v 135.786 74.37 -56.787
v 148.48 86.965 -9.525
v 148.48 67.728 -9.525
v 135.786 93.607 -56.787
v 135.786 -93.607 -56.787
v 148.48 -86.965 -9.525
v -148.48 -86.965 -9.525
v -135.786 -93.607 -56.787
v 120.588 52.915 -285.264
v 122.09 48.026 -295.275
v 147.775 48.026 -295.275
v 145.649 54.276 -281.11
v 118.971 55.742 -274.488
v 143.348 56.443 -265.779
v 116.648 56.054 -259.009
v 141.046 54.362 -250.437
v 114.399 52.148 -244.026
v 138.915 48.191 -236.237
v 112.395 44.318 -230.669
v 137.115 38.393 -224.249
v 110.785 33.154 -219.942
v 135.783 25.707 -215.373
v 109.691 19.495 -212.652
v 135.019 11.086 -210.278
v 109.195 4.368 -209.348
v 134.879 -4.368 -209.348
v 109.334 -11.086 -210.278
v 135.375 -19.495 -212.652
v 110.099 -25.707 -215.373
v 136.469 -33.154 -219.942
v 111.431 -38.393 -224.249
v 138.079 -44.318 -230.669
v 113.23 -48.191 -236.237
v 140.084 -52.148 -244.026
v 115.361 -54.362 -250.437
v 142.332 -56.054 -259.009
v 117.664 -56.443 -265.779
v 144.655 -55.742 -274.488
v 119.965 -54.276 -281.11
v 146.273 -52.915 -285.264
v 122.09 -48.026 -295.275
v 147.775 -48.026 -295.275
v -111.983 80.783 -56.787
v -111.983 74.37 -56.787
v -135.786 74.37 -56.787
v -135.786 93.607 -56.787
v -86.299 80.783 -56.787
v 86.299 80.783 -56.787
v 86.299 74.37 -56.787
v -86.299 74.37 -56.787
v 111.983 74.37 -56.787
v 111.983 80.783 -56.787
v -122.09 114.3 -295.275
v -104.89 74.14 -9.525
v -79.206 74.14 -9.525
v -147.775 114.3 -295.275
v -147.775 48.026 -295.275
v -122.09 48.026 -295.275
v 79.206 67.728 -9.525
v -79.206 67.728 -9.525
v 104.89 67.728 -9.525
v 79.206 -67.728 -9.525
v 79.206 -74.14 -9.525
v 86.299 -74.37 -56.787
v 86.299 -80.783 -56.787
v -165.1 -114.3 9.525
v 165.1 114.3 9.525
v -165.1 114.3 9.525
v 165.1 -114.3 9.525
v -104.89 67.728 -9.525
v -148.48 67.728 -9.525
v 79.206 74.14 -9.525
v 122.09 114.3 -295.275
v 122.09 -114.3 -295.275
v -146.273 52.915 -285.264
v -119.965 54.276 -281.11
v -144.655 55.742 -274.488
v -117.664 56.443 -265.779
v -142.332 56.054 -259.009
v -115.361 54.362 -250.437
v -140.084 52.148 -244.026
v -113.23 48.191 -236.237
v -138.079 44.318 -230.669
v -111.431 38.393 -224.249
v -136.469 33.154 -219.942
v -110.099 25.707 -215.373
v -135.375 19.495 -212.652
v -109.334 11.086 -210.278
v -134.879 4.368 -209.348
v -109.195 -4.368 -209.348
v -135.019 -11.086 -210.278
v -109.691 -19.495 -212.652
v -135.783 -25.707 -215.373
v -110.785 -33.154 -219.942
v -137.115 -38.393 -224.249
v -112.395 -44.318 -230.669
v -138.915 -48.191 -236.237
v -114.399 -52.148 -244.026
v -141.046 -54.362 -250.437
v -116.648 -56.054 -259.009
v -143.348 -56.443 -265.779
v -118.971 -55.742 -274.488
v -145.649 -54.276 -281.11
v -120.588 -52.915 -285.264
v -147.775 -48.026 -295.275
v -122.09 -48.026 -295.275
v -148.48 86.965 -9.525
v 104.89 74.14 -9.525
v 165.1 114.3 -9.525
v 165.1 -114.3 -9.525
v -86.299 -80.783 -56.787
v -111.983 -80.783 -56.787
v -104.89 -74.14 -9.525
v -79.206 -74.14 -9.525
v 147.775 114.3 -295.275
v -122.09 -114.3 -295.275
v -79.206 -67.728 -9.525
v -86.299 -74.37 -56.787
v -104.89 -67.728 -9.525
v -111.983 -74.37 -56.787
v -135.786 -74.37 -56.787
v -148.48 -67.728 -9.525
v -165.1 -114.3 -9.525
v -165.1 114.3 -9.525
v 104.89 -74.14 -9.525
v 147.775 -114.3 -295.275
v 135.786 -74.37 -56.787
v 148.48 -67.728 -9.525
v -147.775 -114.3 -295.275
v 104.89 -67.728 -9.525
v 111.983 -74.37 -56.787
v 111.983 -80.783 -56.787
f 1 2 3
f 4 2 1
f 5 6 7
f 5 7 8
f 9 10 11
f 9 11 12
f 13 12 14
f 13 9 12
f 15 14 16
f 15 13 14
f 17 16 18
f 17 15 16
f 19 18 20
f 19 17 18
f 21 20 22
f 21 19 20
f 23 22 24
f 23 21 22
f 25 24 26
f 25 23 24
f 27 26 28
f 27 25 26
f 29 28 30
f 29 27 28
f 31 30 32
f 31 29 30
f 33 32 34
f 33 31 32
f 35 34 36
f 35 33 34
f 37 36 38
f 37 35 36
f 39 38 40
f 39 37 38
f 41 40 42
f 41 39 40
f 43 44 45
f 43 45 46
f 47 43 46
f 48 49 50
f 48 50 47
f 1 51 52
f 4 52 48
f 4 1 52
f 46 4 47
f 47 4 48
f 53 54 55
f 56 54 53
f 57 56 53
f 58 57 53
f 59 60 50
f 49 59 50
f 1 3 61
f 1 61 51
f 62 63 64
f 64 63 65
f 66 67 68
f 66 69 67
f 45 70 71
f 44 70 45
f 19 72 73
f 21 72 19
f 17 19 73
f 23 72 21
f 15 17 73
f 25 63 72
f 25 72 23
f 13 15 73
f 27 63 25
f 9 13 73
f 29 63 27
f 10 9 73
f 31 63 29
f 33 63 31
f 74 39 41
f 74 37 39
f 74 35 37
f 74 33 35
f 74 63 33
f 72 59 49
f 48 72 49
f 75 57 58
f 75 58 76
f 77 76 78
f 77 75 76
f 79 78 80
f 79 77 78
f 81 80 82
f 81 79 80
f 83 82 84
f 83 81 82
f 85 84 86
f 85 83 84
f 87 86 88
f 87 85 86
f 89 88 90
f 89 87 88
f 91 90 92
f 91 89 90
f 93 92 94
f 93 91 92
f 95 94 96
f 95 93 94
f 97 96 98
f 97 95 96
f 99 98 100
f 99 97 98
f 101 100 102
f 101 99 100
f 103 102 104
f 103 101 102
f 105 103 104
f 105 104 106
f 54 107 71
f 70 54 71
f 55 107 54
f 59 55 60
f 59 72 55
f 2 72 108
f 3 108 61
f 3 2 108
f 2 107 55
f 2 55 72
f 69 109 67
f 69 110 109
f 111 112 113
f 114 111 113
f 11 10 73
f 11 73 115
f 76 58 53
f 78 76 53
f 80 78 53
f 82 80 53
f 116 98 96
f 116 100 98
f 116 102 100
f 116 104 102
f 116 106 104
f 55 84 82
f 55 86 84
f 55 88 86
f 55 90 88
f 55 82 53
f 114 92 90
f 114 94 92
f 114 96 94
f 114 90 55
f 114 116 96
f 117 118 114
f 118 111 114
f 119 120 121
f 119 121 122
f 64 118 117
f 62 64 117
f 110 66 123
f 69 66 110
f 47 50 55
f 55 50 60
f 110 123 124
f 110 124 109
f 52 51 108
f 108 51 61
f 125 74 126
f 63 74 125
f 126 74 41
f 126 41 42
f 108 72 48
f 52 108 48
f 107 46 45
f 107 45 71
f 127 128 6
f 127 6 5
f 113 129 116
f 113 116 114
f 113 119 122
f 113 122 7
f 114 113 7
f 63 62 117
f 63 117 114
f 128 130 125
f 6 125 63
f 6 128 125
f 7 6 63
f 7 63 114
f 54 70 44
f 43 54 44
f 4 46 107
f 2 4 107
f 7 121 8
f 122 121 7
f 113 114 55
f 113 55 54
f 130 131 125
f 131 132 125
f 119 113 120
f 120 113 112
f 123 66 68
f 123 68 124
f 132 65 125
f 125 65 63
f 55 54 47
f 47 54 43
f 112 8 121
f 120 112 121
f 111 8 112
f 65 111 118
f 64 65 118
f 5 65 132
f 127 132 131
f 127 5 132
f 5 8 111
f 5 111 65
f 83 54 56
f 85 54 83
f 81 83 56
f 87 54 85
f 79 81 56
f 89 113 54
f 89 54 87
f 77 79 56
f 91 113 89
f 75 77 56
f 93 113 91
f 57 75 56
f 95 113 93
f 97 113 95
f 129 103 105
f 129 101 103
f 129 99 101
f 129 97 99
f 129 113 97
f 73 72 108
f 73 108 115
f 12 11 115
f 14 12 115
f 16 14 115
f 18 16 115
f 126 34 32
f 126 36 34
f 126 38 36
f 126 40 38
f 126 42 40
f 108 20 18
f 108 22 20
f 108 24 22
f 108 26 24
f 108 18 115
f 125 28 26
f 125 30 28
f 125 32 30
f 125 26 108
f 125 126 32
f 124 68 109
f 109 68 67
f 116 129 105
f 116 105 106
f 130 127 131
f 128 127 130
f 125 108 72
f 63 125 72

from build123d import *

# Parameters (mm, degrees)
F2_DEPTH      = 114.3
F3_DEPTH      = 114.3
F3_DEPTH_BACK = 114.3
F5_DEPTH      = 165.101
F5_DEPTH_BACK = 165.101
F7_DEPTH      = 165.1
F7_DEPTH_BACK = 165.1
F8_DEPTH      = 114.301
F8_DEPTH_BACK = 114.301


with BuildPart() as f2:
    # F0 (on Front) → F2 (new body, symmetric)
    with BuildSketch(Plane.XZ):
        Polygon((165.1, 9.525), (-165.1, 9.525), (-165.1, -9.525), (-148.480117321, -9.525), (-104.8901342862, -9.525), (-79.205680066, -9.525), (79.205680066, -9.525), (104.8901342862, -9.525), (148.480117321, -9.525), (165.1, -9.525), align=None)
    extrude(amount=F2_DEPTH, both=True)


with BuildPart() as f3:
    # F0 (on Front) → F3 (new body, two sides)
    with BuildSketch(Plane.XZ) as f3_sk:
        Polygon((-86.2986203711, -56.7867122591), (-111.9830745913, -56.7867122591), (-147.7749049664, -295.275), (-122.0904507461, -295.275), align=None)
        Polygon((-79.205680066, -9.525), (-104.8901342862, -9.525), (-111.9830745913, -56.7867122591), (-86.2986203711, -56.7867122591), align=None)
    extrude(amount=F3_DEPTH)
    extrude(f3_sk.sketch, amount=-F3_DEPTH_BACK)


with BuildPart() as f3b:
    # F0 (on Front) → F3, piece 2 (new body, two sides)
    with BuildSketch(Plane.XZ) as f3_2_sk:
        Polygon((111.9830745913, -56.7867122591), (104.8901342862, -9.525), (79.205680066, -9.525), (86.2986203711, -56.7867122591), align=None)
        Polygon((147.7749049664, -295.275), (111.9830745913, -56.7867122591), (86.2986203711, -56.7867122591), (122.0904507461, -295.275), align=None)
    extrude(amount=F3_DEPTH)
    extrude(f3_2_sk.sketch, amount=-F3_DEPTH_BACK)


with BuildPart() as f5_tool:
    # F4 (on Right) → F5 (new body, two sides)
    with BuildSketch(Plane.YZ) as f5_sk:
        Polygon((-114.3, -295.275), (-74.1404564838, -9.525), (-114.3000000004, -9.525), align=None)
        with BuildLine():
            Line((-48.0259694159, -295.275), (48.0259694159, -295.275))
            ThreePointArc((48.0259694159, -295.275), (0, -209.1790086692), (-48.0259694159, -295.275))
        make_face()
        Polygon((114.3, -295.275), (114.3, -9.525), (74.1404564838, -9.525), align=None)
    extrude(amount=-F5_DEPTH)
    extrude(f5_sk.sketch, amount=F5_DEPTH_BACK)


with BuildPart() as f3_1:
    add(f3.part)

    # F5: cut by f5_tool
    add(f5_tool.part, mode=Mode.SUBTRACT)


with BuildPart() as f3b_1:
    add(f3b.part)

    # F5: cut by f5_tool
    add(f5_tool.part, mode=Mode.SUBTRACT)


with BuildPart() as f7:
    # F6 (on Right) → F7 (new body, two sides)
    with BuildSketch(Plane.YZ) as f7_sk:
        Polygon((-67.7280513983, -9.525), (-74.1404564838, -9.525), (-80.7826569742, -56.7867122591), (-74.3702518887, -56.7867122591), align=None)
        Polygon((-80.7826569742, -56.7867122591), (-74.1404564838, -9.525), (-86.9652666548, -9.525), (-93.6074671451, -56.7867122591), align=None)
    extrude(amount=F7_DEPTH)
    extrude(f7_sk.sketch, amount=-F7_DEPTH_BACK)


with BuildPart() as f7b:
    # F6 (on Right) → F7, piece 2 (new body, two sides)
    with BuildSketch(Plane.YZ) as f7_2_sk:
        Polygon((74.1404564838, -9.525), (67.7280513983, -9.525), (74.3702518887, -56.7867122591), (80.7826569742, -56.7867122591), align=None)
        Polygon((86.9652666548, -9.525), (74.1404564838, -9.525), (80.7826569742, -56.7867122591), (93.6074671451, -56.7867122591), align=None)
    extrude(amount=F7_DEPTH)
    extrude(f7_2_sk.sketch, amount=-F7_DEPTH_BACK)


with BuildPart() as f8_tool:
    # F0 (on Front) → F8 (new body, two sides)
    with BuildSketch(Plane.XZ) as f8_sk:
        Polygon((-148.480117321, -9.525), (-165.1, -9.525), (-165.1, -56.7867122591), (-135.7862353325, -56.7867122591), align=None)
        Polygon((165.1, -56.7867122591), (165.1, -9.525), (148.480117321, -9.525), (135.7862353325, -56.7867122591), align=None)
    extrude(amount=-F8_DEPTH)
    extrude(f8_sk.sketch, amount=F8_DEPTH_BACK)


with BuildPart() as f7_1:
    add(f7.part)

    # F8: cut by f8_tool
    add(f8_tool.part, mode=Mode.SUBTRACT)

    # F11: cut F3b
    add(f3b_1.part, mode=Mode.SUBTRACT)

    # F12: cut F3
    add(f3_1.part, mode=Mode.SUBTRACT)


with BuildPart() as f7b_1:
    add(f7b.part)

    # F8: cut by f8_tool
    add(f8_tool.part, mode=Mode.SUBTRACT)

    # F9: cut F3
    add(f3_1.part, mode=Mode.SUBTRACT)

    # F10: cut F3b
    add(f3b_1.part, mode=Mode.SUBTRACT)


solid = Compound([f2.part, f3_1.part, f3b_1.part, f7_1.part, f7b_1.part])
